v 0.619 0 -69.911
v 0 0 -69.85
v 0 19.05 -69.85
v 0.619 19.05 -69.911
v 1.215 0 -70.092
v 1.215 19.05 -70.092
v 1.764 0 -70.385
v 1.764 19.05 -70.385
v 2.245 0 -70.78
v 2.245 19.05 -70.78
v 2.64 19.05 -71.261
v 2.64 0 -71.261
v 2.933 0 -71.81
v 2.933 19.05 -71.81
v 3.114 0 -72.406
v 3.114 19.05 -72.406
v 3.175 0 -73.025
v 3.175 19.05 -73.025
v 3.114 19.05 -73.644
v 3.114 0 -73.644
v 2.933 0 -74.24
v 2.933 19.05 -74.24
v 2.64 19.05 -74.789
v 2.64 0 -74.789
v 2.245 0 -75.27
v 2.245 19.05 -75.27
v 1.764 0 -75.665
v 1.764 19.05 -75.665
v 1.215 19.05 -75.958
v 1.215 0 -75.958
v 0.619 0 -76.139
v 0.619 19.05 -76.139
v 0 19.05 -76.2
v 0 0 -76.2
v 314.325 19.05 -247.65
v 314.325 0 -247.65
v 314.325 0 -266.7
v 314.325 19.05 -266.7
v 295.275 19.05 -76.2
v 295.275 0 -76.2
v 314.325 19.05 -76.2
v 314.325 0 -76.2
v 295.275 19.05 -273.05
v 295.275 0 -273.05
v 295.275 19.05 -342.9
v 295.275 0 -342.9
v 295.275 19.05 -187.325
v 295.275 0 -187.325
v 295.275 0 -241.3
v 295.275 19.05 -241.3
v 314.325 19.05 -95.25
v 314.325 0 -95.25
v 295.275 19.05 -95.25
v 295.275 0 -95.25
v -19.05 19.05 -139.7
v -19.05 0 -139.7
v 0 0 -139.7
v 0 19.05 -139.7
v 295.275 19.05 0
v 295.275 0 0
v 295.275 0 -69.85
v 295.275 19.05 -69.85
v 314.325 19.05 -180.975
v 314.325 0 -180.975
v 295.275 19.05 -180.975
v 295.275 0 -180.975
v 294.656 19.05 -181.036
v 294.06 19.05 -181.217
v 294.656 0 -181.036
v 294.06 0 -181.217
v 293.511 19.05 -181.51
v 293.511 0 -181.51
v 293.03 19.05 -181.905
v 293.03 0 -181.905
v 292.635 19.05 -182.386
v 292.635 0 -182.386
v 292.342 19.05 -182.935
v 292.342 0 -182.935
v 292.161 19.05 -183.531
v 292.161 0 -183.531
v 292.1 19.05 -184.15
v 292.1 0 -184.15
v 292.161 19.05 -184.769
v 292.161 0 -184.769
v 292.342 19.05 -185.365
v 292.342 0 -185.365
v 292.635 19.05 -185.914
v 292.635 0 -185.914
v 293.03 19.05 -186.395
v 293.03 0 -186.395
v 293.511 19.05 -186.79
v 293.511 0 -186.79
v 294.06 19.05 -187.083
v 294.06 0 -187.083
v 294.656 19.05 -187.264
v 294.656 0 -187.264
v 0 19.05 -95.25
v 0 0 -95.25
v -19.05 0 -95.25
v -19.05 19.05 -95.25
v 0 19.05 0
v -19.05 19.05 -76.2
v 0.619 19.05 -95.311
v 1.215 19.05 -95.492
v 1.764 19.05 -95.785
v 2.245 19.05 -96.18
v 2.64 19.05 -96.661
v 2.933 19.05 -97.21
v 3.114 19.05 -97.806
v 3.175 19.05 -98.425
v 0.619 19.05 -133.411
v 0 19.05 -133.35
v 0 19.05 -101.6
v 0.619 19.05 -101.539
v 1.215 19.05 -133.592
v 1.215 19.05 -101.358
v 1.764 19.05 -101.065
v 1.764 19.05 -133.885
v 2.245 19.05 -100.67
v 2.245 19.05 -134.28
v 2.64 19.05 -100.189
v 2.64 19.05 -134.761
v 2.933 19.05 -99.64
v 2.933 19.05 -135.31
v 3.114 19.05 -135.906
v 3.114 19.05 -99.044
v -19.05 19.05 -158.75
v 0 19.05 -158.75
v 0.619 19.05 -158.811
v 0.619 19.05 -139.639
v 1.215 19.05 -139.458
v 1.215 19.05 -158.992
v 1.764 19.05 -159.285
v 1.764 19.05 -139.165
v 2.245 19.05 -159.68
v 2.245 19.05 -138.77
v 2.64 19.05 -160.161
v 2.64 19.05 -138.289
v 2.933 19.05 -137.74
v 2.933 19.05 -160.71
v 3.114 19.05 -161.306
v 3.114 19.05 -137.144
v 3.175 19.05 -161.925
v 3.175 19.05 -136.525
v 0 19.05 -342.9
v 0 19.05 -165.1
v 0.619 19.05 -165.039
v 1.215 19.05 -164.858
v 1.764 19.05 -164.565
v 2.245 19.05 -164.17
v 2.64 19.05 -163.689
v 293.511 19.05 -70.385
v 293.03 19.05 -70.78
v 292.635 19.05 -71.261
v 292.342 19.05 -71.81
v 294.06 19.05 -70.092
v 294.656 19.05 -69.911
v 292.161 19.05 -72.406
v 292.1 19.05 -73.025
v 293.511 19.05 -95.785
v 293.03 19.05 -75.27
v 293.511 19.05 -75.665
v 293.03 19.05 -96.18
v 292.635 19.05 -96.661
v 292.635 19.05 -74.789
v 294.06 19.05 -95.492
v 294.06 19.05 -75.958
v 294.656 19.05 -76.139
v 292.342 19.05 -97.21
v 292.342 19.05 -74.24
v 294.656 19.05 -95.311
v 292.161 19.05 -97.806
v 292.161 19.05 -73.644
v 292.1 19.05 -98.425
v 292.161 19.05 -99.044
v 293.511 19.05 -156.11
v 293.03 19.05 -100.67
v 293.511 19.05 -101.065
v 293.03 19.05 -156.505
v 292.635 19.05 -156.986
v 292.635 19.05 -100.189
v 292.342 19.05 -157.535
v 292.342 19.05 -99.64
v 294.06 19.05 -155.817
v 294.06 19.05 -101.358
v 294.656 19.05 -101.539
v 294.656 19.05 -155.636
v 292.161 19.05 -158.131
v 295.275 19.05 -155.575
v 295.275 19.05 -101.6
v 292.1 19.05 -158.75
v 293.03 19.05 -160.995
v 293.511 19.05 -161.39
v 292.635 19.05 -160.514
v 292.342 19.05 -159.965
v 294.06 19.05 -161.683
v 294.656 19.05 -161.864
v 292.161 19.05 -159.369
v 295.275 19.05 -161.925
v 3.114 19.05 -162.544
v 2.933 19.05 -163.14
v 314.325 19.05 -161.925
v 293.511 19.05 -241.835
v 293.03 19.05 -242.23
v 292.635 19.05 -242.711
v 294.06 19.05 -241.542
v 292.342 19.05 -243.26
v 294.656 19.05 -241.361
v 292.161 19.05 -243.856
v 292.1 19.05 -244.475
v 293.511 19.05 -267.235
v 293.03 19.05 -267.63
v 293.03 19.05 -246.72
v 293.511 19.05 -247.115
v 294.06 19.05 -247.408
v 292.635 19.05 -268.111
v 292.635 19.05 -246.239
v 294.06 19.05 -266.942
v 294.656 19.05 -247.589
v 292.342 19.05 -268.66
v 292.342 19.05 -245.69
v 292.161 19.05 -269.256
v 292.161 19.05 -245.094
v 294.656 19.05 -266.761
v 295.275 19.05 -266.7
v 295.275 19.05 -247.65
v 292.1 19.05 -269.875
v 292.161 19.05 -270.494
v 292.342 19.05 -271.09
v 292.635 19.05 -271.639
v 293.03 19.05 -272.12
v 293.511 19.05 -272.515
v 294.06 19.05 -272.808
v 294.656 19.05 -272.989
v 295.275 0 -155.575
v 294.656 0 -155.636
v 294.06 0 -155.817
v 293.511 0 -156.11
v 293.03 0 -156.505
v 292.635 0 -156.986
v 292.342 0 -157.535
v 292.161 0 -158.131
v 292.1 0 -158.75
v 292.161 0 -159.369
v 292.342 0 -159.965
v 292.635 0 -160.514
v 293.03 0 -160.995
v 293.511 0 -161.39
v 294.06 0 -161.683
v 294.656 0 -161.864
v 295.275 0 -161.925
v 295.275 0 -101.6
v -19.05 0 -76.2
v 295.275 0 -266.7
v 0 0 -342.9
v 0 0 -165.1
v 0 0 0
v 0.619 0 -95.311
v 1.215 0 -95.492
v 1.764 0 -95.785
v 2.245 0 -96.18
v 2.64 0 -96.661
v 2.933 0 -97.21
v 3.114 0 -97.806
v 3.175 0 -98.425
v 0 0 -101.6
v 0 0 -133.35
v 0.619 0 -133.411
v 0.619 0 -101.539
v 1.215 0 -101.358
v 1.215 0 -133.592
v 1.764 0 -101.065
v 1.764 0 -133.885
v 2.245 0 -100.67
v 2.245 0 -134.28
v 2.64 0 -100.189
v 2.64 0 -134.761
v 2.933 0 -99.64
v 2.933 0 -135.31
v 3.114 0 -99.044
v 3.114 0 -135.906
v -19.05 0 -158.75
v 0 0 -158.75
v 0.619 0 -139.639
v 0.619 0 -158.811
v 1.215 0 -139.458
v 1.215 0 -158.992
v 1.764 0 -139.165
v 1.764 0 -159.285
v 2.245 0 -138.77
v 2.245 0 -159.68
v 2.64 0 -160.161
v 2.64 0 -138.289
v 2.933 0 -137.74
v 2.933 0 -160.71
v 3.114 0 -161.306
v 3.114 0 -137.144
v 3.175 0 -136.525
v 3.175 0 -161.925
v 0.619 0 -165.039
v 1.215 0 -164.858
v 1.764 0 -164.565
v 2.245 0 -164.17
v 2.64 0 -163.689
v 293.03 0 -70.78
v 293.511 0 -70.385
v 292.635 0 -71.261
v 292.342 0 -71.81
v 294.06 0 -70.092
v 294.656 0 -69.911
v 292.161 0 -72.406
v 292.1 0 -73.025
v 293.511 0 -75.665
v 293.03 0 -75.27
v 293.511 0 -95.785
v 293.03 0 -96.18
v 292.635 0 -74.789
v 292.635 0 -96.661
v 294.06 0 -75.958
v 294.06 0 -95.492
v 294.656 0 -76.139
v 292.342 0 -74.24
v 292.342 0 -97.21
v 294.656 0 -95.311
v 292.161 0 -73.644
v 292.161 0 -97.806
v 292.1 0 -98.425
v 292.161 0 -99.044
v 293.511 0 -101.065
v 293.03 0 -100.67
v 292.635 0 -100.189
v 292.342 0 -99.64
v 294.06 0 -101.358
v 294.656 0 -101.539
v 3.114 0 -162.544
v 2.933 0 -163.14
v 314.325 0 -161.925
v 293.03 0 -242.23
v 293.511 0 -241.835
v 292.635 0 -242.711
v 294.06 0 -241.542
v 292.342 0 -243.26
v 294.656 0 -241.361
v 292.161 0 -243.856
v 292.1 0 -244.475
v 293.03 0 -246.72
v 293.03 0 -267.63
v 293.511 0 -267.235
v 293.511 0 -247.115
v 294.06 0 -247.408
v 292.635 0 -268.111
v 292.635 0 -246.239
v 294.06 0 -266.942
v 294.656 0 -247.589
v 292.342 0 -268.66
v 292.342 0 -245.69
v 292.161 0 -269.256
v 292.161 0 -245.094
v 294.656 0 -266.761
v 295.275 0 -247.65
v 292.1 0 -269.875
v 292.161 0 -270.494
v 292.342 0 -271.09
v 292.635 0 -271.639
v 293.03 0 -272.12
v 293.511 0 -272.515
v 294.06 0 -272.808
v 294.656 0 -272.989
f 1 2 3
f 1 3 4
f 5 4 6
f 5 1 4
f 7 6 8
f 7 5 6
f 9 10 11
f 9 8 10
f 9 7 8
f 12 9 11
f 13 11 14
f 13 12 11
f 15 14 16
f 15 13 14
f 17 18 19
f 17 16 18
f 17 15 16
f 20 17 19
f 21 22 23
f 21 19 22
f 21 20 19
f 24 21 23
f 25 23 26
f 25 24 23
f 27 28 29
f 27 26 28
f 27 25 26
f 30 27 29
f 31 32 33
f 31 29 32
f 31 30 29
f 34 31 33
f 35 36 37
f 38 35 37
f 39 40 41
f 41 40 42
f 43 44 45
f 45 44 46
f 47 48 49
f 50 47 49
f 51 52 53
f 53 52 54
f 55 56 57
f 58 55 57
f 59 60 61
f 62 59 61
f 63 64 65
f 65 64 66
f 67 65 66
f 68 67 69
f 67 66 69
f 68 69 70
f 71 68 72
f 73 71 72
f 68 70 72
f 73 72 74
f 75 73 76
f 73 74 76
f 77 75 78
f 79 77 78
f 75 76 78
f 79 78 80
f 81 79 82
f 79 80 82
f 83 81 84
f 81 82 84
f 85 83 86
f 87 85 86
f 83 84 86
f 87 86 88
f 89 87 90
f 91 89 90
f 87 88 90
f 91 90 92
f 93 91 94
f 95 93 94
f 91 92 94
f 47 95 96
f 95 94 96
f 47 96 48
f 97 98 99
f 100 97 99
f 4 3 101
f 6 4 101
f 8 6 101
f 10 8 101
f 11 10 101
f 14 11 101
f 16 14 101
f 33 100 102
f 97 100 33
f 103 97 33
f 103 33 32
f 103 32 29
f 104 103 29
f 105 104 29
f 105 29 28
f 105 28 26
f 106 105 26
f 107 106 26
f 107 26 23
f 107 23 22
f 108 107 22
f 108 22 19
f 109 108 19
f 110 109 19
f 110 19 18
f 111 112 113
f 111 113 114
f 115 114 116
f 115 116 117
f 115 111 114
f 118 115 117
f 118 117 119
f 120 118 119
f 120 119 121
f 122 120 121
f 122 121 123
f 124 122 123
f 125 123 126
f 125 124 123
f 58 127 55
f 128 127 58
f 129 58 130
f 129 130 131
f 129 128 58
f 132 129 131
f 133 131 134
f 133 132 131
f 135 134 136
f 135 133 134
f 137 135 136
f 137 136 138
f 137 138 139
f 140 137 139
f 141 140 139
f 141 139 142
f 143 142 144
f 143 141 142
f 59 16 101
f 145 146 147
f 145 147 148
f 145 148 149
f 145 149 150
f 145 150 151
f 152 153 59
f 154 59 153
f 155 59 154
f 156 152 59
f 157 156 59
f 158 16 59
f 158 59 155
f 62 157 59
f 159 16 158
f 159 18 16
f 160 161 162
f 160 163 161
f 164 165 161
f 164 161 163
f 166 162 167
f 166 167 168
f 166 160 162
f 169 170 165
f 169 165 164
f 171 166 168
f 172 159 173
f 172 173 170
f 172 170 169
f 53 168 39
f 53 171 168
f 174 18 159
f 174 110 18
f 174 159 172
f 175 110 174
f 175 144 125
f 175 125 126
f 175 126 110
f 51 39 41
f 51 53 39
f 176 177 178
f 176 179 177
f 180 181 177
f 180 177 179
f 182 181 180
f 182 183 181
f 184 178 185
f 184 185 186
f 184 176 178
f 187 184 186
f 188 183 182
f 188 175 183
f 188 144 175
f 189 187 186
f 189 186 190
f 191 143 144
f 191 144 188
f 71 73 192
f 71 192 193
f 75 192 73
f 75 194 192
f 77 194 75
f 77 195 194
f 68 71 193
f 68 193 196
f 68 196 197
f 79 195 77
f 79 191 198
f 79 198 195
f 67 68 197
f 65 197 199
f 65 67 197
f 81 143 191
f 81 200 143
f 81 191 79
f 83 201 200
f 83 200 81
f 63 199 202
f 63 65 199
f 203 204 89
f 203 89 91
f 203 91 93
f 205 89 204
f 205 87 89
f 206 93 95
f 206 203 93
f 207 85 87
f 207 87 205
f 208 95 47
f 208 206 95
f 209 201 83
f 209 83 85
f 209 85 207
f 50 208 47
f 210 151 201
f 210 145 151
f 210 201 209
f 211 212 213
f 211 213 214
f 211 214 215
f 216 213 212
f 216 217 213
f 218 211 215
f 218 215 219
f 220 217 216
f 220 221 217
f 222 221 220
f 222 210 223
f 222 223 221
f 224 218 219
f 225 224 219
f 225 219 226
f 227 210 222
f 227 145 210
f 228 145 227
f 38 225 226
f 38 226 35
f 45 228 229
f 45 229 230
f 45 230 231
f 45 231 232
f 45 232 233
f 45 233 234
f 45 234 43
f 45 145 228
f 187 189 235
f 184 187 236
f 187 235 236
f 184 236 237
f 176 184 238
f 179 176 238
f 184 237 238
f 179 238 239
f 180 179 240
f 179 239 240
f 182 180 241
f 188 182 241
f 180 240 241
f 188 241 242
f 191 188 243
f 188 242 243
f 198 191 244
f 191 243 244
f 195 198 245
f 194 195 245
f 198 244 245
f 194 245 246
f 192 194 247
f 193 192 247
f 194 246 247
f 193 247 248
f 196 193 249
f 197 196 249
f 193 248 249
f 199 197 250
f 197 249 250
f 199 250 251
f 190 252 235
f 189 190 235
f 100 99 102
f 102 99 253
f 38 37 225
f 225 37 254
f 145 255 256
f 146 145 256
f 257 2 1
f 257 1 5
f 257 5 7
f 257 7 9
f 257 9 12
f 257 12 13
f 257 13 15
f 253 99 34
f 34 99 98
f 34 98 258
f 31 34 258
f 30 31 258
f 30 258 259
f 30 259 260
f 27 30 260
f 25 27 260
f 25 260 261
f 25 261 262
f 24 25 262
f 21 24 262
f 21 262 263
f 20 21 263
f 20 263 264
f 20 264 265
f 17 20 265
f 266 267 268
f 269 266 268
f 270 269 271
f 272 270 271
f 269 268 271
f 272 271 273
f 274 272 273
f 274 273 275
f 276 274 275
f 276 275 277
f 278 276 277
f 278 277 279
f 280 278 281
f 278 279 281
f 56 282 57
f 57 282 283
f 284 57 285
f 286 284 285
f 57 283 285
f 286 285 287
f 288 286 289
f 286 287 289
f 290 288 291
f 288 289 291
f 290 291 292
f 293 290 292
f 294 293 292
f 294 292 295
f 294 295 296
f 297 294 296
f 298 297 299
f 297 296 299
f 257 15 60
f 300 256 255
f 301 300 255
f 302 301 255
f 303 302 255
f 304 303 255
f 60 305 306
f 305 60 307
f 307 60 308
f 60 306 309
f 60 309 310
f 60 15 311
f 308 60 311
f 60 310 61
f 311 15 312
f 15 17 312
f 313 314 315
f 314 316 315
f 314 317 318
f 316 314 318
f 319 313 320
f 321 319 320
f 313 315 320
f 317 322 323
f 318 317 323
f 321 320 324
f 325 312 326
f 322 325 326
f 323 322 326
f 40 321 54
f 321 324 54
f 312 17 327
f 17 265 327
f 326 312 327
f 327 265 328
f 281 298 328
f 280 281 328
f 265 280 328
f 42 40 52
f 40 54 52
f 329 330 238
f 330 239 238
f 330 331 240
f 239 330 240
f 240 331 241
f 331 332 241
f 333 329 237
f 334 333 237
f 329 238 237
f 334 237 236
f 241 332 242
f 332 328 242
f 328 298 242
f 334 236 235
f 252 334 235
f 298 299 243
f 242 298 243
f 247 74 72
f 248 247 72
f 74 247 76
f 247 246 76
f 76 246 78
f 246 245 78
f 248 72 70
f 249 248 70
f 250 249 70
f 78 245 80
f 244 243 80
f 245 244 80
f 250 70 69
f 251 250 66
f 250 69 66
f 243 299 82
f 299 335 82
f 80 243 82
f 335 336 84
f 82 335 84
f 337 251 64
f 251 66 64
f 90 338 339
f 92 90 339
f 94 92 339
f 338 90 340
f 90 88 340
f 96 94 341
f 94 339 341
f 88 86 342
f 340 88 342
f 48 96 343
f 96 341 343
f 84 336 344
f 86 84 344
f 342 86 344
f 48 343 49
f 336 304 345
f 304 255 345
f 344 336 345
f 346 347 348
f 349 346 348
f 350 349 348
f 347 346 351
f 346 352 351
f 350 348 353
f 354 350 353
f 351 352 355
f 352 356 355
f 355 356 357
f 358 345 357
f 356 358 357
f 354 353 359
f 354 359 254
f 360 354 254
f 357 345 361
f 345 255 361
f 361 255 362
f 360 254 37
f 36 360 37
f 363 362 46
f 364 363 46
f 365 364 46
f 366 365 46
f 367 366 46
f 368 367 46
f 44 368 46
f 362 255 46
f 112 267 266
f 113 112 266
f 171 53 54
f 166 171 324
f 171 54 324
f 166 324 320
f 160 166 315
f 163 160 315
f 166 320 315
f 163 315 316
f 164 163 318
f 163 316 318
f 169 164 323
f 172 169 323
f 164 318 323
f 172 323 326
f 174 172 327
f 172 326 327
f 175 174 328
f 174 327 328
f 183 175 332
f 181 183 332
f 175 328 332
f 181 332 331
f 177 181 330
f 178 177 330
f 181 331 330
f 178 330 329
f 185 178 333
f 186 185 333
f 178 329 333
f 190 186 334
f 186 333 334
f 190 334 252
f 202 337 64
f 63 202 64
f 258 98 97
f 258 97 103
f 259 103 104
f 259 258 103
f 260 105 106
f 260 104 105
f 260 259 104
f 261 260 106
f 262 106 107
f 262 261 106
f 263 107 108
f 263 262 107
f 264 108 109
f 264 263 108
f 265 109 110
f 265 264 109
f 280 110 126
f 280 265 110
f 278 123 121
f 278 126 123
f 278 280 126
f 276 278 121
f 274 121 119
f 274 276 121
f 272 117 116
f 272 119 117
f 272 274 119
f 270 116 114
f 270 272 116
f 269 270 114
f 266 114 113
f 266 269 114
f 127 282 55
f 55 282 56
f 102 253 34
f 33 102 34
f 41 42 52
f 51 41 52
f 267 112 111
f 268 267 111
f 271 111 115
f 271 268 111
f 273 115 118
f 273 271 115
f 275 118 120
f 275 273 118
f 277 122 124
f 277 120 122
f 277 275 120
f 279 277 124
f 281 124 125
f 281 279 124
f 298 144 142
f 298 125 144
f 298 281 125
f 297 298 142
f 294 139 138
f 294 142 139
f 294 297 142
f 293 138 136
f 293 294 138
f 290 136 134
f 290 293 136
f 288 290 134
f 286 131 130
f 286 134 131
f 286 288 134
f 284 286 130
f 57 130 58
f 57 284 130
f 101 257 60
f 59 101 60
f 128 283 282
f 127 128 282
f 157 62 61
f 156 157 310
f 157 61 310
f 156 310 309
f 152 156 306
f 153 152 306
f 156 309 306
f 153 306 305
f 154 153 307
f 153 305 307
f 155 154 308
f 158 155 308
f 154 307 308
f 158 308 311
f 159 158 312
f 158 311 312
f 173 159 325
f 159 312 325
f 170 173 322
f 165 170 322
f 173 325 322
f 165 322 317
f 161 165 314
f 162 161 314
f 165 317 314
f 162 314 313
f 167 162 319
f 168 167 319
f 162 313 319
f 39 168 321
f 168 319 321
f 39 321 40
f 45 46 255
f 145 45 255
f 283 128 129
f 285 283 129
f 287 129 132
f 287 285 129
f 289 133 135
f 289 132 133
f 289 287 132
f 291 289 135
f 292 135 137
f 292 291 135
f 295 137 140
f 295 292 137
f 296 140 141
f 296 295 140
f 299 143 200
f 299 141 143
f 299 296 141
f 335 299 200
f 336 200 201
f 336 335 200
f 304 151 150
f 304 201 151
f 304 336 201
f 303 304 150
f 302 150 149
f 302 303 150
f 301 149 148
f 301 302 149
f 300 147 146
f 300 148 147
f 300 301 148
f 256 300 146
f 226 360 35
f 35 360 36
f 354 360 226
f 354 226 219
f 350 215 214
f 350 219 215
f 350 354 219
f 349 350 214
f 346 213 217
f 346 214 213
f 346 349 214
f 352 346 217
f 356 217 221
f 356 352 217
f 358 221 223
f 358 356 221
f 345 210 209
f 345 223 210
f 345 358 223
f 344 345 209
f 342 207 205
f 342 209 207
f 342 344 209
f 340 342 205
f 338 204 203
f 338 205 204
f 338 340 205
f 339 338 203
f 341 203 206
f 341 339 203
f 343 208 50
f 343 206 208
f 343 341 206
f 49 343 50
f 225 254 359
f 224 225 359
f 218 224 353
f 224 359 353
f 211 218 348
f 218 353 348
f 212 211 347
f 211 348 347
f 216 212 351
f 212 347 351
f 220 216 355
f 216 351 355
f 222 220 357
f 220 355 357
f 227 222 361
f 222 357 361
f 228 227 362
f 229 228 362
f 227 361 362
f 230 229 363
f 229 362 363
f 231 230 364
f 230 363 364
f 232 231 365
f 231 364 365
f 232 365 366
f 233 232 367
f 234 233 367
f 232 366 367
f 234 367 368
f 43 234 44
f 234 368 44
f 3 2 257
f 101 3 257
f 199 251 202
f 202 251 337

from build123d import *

# Parameters (mm, degrees)
BOSS_EXTRUDE1_DEPTH     = 19.05
CUT_EXTRUDE1_DEPTH      = 466.557212515
CUT_EXTRUDE1_DEPTH_BACK = 466.557212515


with BuildPart() as part:
    # Sketch1 → Boss-Extrude1 (new body)
    with BuildSketch(Plane(origin=(0, 0, 0), x_dir=(1, 0, 0), z_dir=(0, 1, 0))):
        Polygon((0, 0), (295.275, 0), (295.275, 76.2), (314.325, 76.2), (314.325, 95.25), (295.275, 95.25), (295.275, 161.925), (314.325, 161.925), (314.325, 180.975), (295.275, 180.975), (295.275, 247.65), (314.325, 247.65), (314.325, 266.7), (295.275, 266.7), (295.275, 342.9), (0, 342.9), (0, 158.75), (-19.05, 158.75), (-19.05, 139.7), (0, 139.7), (0, 95.25), (-19.05, 95.25), (-19.05, 76.2), (0, 76.2), align=None)
    extrude(amount=BOSS_EXTRUDE1_DEPTH)

    # Sketch2 → Cut-Extrude1 (cut, two sides: drawn at the far end of the back side and taken through both)
    with BuildSketch(Plane(origin=(0, 19.05, 0), x_dir=(1, 0, 0), z_dir=(0, 1, 0)).offset(-CUT_EXTRUDE1_DEPTH_BACK)):
        with BuildLine():
            Line((0, 165.1), (0, 158.75))
            ThreePointArc((0, 158.75), (3.175, 161.925), (0, 165.1))
        make_face()
        with BuildLine():
            Line((0, 139.7), (0, 133.35))
            ThreePointArc((0, 133.35), (3.175, 136.525), (0, 139.7))
        make_face()
        with BuildLine():
            Line((0, 101.6), (0, 95.25))
            ThreePointArc((0, 95.25), (3.175, 98.425), (0, 101.6))
        make_face()
        with BuildLine():
            Line((0, 76.2), (0, 69.85))
            ThreePointArc((0, 69.85), (3.175, 73.025), (0, 76.2))
        make_face()
        with BuildLine():
            Line((295.275, 273.05), (295.275, 266.7))
            ThreePointArc((295.275, 266.7), (292.1, 269.875), (295.275, 273.05))
        make_face()
        with BuildLine():
            Line((295.275, 241.3), (295.275, 247.65))
            ThreePointArc((295.275, 247.65), (292.1, 244.475), (295.275, 241.3))
        make_face()
        with BuildLine():
            Line((295.275, 101.6), (295.275, 95.25))
            ThreePointArc((295.275, 95.25), (292.1, 98.425), (295.275, 101.6))
        make_face()
        with BuildLine():
            Line((295.275, 76.2), (295.275, 69.85))
            ThreePointArc((295.275, 69.85), (292.1, 73.025), (295.275, 76.2))
        make_face()
        with BuildLine():
            Line((295.275, 161.925), (295.275, 155.575))
            ThreePointArc((295.275, 155.575), (292.1, 158.75), (295.275, 161.925))
        make_face()
        with BuildLine():
            Line((295.275, 187.325), (295.275, 180.975))
            ThreePointArc((295.275, 180.975), (292.1, 184.15), (295.275, 187.325))
        make_face()
    extrude(amount=CUT_EXTRUDE1_DEPTH + CUT_EXTRUDE1_DEPTH_BACK, mode=Mode.SUBTRACT)


solid = part.part
